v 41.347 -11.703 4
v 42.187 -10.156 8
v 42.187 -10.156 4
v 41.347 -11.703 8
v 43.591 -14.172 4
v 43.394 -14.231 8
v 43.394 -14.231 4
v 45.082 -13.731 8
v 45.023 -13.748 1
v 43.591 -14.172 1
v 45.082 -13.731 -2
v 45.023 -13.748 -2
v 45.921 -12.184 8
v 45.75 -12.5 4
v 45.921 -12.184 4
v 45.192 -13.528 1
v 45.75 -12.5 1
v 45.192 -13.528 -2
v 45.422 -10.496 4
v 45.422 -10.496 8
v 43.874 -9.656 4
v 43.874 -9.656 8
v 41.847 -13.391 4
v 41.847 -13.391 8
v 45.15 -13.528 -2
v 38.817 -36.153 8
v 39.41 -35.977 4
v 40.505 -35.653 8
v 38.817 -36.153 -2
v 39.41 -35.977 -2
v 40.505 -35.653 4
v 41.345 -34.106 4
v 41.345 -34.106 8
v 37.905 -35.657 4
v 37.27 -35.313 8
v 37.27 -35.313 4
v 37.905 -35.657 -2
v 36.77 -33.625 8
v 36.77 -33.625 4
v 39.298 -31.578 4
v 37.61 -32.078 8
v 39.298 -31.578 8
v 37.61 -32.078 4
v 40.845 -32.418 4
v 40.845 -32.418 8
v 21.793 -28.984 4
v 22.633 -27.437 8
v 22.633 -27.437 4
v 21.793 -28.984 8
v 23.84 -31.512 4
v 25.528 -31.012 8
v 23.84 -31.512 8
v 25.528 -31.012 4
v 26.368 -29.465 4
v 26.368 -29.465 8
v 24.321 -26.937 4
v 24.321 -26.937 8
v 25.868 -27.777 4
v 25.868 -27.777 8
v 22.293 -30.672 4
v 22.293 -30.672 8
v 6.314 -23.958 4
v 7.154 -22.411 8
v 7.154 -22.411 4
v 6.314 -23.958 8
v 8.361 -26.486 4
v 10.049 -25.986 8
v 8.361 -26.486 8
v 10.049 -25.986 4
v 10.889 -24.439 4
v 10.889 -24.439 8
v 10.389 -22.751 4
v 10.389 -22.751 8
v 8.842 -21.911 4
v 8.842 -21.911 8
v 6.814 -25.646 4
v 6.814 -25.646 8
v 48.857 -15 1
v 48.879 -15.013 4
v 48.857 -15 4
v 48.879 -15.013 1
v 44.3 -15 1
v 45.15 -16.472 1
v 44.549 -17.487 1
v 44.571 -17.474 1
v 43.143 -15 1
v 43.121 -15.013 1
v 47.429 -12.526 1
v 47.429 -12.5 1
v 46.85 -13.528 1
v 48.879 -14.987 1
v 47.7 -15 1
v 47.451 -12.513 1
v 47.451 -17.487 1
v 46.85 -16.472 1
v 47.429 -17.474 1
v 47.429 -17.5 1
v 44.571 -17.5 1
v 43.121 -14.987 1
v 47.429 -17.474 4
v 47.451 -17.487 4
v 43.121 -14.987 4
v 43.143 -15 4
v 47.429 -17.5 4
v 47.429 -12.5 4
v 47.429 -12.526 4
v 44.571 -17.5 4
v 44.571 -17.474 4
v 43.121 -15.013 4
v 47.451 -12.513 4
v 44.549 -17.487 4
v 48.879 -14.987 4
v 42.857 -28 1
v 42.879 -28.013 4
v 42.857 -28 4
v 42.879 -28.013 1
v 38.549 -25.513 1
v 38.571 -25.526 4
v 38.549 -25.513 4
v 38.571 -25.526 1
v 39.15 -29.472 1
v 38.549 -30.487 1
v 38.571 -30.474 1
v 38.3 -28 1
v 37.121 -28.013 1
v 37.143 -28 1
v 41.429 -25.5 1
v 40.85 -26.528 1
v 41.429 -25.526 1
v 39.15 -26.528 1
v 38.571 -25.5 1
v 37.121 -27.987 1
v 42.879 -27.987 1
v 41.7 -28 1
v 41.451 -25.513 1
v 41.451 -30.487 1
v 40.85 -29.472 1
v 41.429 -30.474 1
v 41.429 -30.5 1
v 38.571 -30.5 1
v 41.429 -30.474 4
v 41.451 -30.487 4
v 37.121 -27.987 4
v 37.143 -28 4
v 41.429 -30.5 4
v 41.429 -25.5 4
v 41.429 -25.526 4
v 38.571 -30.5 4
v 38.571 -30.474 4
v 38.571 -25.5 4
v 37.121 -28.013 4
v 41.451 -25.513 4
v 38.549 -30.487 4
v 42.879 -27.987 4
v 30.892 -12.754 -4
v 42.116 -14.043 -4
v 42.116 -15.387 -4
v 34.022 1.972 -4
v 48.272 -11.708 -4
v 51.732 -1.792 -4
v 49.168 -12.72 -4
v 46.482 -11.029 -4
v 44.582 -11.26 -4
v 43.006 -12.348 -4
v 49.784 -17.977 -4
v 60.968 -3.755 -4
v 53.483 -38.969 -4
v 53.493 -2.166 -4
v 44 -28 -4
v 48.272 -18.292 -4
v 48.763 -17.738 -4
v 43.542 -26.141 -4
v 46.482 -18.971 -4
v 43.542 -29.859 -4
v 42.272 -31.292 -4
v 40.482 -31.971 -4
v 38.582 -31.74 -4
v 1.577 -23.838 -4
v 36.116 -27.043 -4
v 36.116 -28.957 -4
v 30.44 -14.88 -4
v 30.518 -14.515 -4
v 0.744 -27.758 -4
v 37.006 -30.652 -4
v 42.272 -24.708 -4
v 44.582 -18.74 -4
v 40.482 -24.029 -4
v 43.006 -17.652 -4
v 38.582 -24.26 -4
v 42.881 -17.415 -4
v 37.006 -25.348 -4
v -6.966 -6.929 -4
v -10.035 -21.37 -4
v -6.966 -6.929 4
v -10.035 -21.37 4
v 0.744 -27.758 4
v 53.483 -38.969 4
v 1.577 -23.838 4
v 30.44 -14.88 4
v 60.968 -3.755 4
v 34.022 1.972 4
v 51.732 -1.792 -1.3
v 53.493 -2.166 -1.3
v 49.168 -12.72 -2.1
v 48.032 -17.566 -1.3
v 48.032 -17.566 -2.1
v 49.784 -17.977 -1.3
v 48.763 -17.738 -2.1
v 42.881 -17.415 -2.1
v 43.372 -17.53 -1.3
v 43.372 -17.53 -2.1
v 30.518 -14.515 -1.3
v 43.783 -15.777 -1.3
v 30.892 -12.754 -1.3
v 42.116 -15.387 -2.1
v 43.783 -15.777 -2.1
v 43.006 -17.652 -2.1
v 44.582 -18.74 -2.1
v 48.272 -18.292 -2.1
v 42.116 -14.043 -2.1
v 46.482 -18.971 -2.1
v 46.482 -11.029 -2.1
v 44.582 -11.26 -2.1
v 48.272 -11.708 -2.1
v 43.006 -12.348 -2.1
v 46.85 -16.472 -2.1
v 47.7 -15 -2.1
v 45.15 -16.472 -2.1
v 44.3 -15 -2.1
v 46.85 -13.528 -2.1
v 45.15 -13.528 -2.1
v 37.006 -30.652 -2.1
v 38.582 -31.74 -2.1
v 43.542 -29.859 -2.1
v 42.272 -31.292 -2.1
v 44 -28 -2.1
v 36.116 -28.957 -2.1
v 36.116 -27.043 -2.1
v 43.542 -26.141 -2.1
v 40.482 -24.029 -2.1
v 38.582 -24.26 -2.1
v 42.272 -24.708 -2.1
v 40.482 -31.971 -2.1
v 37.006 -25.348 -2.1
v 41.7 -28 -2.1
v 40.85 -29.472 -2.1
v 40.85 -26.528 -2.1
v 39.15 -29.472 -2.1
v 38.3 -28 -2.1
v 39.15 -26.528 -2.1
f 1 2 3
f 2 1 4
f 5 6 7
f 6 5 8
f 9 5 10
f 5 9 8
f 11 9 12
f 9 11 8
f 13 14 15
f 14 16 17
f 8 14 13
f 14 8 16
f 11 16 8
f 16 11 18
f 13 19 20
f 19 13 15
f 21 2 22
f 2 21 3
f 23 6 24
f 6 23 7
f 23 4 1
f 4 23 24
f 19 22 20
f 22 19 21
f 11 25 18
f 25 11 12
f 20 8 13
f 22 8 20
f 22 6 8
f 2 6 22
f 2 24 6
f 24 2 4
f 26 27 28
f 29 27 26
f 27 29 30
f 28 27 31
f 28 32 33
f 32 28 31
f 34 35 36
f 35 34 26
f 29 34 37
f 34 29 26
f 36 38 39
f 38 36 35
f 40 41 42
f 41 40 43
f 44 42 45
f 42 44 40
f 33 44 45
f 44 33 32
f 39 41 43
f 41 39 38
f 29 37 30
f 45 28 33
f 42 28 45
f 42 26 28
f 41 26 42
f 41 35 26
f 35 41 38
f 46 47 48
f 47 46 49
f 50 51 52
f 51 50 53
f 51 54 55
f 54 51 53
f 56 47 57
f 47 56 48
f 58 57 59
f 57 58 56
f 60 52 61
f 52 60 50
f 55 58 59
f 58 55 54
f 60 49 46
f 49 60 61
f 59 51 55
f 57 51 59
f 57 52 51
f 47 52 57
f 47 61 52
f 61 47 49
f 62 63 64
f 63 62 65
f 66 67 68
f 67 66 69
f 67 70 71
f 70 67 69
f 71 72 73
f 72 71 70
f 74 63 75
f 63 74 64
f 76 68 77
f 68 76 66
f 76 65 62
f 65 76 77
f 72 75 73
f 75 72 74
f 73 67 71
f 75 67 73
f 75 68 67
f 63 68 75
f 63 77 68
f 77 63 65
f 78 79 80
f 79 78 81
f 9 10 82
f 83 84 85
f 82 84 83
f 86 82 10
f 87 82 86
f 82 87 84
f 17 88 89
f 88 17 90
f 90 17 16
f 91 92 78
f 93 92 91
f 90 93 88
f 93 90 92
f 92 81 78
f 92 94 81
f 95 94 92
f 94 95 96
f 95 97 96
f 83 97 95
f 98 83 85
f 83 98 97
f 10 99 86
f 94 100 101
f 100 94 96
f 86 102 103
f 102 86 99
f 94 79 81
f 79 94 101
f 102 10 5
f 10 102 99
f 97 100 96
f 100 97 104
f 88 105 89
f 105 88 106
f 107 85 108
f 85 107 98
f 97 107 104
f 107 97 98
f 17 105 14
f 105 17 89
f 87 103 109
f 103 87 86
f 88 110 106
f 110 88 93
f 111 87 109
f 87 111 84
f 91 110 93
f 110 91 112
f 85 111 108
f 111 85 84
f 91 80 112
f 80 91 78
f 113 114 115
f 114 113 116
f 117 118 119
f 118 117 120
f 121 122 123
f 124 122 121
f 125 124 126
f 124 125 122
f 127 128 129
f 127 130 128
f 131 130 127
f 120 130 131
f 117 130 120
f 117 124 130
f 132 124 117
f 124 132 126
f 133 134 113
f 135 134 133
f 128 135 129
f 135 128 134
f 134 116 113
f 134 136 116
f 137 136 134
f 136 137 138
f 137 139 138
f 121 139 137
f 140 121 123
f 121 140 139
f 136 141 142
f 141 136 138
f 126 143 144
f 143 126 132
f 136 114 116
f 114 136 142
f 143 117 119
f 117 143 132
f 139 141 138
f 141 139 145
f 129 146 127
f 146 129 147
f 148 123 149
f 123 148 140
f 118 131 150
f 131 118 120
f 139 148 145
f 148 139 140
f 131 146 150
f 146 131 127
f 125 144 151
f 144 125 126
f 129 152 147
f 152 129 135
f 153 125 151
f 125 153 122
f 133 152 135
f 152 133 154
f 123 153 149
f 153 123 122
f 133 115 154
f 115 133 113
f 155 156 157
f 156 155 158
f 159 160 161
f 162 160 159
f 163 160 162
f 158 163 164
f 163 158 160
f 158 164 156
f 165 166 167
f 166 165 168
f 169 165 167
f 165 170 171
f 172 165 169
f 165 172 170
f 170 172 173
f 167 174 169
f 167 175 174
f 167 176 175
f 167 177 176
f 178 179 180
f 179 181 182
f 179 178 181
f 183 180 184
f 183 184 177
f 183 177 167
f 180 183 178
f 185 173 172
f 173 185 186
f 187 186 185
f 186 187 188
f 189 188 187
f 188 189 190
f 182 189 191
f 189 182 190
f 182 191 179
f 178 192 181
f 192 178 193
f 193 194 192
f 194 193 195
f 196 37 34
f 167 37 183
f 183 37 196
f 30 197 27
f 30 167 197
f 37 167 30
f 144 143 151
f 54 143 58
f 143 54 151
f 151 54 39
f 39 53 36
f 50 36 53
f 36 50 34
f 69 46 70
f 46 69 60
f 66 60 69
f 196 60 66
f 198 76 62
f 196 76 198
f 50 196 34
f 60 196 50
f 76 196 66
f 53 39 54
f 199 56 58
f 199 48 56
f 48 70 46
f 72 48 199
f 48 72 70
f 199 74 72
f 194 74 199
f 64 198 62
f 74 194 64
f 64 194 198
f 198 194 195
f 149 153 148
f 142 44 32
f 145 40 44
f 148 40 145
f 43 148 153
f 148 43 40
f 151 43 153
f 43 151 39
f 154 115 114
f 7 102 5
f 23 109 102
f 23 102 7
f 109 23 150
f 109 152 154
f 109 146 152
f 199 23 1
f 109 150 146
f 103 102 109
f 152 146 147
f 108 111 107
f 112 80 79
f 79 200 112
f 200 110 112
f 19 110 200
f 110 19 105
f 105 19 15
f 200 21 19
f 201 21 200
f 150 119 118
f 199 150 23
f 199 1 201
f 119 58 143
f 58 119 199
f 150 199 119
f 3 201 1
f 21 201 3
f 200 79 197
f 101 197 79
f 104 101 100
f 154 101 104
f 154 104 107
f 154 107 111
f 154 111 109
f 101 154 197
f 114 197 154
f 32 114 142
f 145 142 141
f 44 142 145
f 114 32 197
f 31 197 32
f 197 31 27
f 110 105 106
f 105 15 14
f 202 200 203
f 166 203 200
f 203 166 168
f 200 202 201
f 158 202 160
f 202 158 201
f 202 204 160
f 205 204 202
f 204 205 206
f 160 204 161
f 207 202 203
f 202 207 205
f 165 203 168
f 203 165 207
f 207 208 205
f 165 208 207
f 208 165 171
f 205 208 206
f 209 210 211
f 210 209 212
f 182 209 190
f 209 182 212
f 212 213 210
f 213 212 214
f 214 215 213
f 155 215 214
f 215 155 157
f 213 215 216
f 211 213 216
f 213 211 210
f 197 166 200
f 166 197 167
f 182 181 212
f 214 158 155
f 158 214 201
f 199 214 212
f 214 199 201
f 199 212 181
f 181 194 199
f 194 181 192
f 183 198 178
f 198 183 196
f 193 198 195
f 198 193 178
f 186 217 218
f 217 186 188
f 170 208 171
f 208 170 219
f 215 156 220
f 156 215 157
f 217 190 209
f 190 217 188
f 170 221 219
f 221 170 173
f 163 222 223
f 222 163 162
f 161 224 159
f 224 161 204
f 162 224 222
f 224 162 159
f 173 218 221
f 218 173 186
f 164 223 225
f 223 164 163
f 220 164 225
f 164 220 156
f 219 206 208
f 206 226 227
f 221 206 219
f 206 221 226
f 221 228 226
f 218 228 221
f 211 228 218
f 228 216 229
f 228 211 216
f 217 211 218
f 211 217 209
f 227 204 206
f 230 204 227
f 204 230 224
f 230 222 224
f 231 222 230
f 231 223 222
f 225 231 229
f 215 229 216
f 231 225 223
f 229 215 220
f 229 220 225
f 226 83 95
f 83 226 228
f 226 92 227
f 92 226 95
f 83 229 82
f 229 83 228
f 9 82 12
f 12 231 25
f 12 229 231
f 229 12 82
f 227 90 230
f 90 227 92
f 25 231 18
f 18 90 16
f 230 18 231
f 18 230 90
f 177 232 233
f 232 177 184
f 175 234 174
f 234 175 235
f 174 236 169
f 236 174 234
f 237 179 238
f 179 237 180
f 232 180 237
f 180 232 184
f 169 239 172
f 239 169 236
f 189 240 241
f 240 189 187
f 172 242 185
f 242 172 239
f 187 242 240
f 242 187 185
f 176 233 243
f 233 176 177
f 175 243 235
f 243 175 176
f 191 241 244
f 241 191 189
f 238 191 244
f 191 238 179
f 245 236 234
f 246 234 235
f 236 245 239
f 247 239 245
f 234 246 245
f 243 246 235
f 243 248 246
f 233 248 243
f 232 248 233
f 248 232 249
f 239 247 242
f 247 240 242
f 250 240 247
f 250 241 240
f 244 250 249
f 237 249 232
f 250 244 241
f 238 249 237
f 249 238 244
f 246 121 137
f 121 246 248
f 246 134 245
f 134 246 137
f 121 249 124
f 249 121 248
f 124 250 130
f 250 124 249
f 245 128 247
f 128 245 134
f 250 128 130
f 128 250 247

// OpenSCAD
//
// Block to hold tubing and modulate liquid flow
// 
// size is the XY plane size, height in Z
module hexagon(size, height) {
  boxWidth = size/1.75;
  for (r = [-60, 0, 60])
    rotate([0,0,r])
      cube([boxWidth, size, height], true);
}

module rotary()
{
	module hole(r, h) {
		rotate([0,0,0])
			cylinder(r=r, h=h,center=true);
	}
	// MOUNTING POSTS
	module posts() {
	 translate([114.26,0,-3])
	   hole(hradius, thickplus);
 	 translate([112,22.28,-3])
 	   hole(hradius, thickplus);

//   translate([98.61, 0, -3])
//	   hole( hradius, thickplus);
   translate([96.62, 19.23, -3])
	   hole( hradius, thickplus);

   translate([80.7, 15.85, -3])
	   hole( hradius, thickplus);
   }

    translate([-70,0,0]) rotate([0,0,alpha/2]) posts();

	difference() {
	// BODY (to be subtracted from)
	 translate([long+8,width/3+4,0])
	  rotate([0,0,alpha])
	   cube([length+16,width,thick],center=true);

	// WIRE TROUGH
	 translate([long+25,1+width/3,thickplus/2-dia])
	   rotate([0,0,90+1.1*alpha])
	     translate([-6,-1,0])
            cube([length/3,dia, dia+2],center=true);

	 translate([long+4,1+width/3,thickplus/2-dia])
	   rotate([0,0,1.1*alpha])
            cube([length/2, dia, dia+2],center=true);

    // WIRE CUT-OUT
	 translate([long+width+12,6+width/2,0])
	  rotate([0,0,alpha])
	   cube([30,40,thickplus],center=true);

	// CORNER CUT-OUTS
// lower left
	 translate([long-width/2,0,0])
	  rotate([0,0,alpha])
	   cube([length-10,width/1.9,thickplus],center=true);
// upper right
//	 translate([long+18,width-2,0])
//	  rotate([0,0,alpha])
//	   cube([length/2,2+width/3,thickplus],center=true);

// Upper left
	 translate([medium-20,width-9,0])
	  rotate([0,0,alpha])
	   cube([length/3,2+width/4,thickplus],center=true);

    translate([46,15,-3]) hexagon(5,4);
    translate([46,15,4]) cylinder(r=4,h=dia+2,center=true);
    translate([46,15,4]) cylinder(r=1.7,h=width,center=true);
    translate([40,28,-3]) hexagon(5,4);
    translate([40,28,4]) cylinder(r=4,h=dia+2,center=true);
    translate([40,28,4]) cylinder(r=1.7,h=width,center=true);
}

	alpha  = 12; // Angle between radials in degrees

	length = 64; // mm   Main Block
	width  = 36; // mm
	thick = 8;  // 8mm

	thickplus = thick + 2;  // plus margin

	long   = 24; // mm  // Distances from center
	medium = 10; // mm
//	long   = 154; // mm  // Distances from center
//	medium = 133; // mm
	short  = 120; // mm

	hradius = 2.3;    // mounting hole radius mm
	dia     = 1.8;  // wire trough mm
	offset  = 5.6;  // distance from edge to mounting hole
}

rotate([180,0,0]) rotary();
